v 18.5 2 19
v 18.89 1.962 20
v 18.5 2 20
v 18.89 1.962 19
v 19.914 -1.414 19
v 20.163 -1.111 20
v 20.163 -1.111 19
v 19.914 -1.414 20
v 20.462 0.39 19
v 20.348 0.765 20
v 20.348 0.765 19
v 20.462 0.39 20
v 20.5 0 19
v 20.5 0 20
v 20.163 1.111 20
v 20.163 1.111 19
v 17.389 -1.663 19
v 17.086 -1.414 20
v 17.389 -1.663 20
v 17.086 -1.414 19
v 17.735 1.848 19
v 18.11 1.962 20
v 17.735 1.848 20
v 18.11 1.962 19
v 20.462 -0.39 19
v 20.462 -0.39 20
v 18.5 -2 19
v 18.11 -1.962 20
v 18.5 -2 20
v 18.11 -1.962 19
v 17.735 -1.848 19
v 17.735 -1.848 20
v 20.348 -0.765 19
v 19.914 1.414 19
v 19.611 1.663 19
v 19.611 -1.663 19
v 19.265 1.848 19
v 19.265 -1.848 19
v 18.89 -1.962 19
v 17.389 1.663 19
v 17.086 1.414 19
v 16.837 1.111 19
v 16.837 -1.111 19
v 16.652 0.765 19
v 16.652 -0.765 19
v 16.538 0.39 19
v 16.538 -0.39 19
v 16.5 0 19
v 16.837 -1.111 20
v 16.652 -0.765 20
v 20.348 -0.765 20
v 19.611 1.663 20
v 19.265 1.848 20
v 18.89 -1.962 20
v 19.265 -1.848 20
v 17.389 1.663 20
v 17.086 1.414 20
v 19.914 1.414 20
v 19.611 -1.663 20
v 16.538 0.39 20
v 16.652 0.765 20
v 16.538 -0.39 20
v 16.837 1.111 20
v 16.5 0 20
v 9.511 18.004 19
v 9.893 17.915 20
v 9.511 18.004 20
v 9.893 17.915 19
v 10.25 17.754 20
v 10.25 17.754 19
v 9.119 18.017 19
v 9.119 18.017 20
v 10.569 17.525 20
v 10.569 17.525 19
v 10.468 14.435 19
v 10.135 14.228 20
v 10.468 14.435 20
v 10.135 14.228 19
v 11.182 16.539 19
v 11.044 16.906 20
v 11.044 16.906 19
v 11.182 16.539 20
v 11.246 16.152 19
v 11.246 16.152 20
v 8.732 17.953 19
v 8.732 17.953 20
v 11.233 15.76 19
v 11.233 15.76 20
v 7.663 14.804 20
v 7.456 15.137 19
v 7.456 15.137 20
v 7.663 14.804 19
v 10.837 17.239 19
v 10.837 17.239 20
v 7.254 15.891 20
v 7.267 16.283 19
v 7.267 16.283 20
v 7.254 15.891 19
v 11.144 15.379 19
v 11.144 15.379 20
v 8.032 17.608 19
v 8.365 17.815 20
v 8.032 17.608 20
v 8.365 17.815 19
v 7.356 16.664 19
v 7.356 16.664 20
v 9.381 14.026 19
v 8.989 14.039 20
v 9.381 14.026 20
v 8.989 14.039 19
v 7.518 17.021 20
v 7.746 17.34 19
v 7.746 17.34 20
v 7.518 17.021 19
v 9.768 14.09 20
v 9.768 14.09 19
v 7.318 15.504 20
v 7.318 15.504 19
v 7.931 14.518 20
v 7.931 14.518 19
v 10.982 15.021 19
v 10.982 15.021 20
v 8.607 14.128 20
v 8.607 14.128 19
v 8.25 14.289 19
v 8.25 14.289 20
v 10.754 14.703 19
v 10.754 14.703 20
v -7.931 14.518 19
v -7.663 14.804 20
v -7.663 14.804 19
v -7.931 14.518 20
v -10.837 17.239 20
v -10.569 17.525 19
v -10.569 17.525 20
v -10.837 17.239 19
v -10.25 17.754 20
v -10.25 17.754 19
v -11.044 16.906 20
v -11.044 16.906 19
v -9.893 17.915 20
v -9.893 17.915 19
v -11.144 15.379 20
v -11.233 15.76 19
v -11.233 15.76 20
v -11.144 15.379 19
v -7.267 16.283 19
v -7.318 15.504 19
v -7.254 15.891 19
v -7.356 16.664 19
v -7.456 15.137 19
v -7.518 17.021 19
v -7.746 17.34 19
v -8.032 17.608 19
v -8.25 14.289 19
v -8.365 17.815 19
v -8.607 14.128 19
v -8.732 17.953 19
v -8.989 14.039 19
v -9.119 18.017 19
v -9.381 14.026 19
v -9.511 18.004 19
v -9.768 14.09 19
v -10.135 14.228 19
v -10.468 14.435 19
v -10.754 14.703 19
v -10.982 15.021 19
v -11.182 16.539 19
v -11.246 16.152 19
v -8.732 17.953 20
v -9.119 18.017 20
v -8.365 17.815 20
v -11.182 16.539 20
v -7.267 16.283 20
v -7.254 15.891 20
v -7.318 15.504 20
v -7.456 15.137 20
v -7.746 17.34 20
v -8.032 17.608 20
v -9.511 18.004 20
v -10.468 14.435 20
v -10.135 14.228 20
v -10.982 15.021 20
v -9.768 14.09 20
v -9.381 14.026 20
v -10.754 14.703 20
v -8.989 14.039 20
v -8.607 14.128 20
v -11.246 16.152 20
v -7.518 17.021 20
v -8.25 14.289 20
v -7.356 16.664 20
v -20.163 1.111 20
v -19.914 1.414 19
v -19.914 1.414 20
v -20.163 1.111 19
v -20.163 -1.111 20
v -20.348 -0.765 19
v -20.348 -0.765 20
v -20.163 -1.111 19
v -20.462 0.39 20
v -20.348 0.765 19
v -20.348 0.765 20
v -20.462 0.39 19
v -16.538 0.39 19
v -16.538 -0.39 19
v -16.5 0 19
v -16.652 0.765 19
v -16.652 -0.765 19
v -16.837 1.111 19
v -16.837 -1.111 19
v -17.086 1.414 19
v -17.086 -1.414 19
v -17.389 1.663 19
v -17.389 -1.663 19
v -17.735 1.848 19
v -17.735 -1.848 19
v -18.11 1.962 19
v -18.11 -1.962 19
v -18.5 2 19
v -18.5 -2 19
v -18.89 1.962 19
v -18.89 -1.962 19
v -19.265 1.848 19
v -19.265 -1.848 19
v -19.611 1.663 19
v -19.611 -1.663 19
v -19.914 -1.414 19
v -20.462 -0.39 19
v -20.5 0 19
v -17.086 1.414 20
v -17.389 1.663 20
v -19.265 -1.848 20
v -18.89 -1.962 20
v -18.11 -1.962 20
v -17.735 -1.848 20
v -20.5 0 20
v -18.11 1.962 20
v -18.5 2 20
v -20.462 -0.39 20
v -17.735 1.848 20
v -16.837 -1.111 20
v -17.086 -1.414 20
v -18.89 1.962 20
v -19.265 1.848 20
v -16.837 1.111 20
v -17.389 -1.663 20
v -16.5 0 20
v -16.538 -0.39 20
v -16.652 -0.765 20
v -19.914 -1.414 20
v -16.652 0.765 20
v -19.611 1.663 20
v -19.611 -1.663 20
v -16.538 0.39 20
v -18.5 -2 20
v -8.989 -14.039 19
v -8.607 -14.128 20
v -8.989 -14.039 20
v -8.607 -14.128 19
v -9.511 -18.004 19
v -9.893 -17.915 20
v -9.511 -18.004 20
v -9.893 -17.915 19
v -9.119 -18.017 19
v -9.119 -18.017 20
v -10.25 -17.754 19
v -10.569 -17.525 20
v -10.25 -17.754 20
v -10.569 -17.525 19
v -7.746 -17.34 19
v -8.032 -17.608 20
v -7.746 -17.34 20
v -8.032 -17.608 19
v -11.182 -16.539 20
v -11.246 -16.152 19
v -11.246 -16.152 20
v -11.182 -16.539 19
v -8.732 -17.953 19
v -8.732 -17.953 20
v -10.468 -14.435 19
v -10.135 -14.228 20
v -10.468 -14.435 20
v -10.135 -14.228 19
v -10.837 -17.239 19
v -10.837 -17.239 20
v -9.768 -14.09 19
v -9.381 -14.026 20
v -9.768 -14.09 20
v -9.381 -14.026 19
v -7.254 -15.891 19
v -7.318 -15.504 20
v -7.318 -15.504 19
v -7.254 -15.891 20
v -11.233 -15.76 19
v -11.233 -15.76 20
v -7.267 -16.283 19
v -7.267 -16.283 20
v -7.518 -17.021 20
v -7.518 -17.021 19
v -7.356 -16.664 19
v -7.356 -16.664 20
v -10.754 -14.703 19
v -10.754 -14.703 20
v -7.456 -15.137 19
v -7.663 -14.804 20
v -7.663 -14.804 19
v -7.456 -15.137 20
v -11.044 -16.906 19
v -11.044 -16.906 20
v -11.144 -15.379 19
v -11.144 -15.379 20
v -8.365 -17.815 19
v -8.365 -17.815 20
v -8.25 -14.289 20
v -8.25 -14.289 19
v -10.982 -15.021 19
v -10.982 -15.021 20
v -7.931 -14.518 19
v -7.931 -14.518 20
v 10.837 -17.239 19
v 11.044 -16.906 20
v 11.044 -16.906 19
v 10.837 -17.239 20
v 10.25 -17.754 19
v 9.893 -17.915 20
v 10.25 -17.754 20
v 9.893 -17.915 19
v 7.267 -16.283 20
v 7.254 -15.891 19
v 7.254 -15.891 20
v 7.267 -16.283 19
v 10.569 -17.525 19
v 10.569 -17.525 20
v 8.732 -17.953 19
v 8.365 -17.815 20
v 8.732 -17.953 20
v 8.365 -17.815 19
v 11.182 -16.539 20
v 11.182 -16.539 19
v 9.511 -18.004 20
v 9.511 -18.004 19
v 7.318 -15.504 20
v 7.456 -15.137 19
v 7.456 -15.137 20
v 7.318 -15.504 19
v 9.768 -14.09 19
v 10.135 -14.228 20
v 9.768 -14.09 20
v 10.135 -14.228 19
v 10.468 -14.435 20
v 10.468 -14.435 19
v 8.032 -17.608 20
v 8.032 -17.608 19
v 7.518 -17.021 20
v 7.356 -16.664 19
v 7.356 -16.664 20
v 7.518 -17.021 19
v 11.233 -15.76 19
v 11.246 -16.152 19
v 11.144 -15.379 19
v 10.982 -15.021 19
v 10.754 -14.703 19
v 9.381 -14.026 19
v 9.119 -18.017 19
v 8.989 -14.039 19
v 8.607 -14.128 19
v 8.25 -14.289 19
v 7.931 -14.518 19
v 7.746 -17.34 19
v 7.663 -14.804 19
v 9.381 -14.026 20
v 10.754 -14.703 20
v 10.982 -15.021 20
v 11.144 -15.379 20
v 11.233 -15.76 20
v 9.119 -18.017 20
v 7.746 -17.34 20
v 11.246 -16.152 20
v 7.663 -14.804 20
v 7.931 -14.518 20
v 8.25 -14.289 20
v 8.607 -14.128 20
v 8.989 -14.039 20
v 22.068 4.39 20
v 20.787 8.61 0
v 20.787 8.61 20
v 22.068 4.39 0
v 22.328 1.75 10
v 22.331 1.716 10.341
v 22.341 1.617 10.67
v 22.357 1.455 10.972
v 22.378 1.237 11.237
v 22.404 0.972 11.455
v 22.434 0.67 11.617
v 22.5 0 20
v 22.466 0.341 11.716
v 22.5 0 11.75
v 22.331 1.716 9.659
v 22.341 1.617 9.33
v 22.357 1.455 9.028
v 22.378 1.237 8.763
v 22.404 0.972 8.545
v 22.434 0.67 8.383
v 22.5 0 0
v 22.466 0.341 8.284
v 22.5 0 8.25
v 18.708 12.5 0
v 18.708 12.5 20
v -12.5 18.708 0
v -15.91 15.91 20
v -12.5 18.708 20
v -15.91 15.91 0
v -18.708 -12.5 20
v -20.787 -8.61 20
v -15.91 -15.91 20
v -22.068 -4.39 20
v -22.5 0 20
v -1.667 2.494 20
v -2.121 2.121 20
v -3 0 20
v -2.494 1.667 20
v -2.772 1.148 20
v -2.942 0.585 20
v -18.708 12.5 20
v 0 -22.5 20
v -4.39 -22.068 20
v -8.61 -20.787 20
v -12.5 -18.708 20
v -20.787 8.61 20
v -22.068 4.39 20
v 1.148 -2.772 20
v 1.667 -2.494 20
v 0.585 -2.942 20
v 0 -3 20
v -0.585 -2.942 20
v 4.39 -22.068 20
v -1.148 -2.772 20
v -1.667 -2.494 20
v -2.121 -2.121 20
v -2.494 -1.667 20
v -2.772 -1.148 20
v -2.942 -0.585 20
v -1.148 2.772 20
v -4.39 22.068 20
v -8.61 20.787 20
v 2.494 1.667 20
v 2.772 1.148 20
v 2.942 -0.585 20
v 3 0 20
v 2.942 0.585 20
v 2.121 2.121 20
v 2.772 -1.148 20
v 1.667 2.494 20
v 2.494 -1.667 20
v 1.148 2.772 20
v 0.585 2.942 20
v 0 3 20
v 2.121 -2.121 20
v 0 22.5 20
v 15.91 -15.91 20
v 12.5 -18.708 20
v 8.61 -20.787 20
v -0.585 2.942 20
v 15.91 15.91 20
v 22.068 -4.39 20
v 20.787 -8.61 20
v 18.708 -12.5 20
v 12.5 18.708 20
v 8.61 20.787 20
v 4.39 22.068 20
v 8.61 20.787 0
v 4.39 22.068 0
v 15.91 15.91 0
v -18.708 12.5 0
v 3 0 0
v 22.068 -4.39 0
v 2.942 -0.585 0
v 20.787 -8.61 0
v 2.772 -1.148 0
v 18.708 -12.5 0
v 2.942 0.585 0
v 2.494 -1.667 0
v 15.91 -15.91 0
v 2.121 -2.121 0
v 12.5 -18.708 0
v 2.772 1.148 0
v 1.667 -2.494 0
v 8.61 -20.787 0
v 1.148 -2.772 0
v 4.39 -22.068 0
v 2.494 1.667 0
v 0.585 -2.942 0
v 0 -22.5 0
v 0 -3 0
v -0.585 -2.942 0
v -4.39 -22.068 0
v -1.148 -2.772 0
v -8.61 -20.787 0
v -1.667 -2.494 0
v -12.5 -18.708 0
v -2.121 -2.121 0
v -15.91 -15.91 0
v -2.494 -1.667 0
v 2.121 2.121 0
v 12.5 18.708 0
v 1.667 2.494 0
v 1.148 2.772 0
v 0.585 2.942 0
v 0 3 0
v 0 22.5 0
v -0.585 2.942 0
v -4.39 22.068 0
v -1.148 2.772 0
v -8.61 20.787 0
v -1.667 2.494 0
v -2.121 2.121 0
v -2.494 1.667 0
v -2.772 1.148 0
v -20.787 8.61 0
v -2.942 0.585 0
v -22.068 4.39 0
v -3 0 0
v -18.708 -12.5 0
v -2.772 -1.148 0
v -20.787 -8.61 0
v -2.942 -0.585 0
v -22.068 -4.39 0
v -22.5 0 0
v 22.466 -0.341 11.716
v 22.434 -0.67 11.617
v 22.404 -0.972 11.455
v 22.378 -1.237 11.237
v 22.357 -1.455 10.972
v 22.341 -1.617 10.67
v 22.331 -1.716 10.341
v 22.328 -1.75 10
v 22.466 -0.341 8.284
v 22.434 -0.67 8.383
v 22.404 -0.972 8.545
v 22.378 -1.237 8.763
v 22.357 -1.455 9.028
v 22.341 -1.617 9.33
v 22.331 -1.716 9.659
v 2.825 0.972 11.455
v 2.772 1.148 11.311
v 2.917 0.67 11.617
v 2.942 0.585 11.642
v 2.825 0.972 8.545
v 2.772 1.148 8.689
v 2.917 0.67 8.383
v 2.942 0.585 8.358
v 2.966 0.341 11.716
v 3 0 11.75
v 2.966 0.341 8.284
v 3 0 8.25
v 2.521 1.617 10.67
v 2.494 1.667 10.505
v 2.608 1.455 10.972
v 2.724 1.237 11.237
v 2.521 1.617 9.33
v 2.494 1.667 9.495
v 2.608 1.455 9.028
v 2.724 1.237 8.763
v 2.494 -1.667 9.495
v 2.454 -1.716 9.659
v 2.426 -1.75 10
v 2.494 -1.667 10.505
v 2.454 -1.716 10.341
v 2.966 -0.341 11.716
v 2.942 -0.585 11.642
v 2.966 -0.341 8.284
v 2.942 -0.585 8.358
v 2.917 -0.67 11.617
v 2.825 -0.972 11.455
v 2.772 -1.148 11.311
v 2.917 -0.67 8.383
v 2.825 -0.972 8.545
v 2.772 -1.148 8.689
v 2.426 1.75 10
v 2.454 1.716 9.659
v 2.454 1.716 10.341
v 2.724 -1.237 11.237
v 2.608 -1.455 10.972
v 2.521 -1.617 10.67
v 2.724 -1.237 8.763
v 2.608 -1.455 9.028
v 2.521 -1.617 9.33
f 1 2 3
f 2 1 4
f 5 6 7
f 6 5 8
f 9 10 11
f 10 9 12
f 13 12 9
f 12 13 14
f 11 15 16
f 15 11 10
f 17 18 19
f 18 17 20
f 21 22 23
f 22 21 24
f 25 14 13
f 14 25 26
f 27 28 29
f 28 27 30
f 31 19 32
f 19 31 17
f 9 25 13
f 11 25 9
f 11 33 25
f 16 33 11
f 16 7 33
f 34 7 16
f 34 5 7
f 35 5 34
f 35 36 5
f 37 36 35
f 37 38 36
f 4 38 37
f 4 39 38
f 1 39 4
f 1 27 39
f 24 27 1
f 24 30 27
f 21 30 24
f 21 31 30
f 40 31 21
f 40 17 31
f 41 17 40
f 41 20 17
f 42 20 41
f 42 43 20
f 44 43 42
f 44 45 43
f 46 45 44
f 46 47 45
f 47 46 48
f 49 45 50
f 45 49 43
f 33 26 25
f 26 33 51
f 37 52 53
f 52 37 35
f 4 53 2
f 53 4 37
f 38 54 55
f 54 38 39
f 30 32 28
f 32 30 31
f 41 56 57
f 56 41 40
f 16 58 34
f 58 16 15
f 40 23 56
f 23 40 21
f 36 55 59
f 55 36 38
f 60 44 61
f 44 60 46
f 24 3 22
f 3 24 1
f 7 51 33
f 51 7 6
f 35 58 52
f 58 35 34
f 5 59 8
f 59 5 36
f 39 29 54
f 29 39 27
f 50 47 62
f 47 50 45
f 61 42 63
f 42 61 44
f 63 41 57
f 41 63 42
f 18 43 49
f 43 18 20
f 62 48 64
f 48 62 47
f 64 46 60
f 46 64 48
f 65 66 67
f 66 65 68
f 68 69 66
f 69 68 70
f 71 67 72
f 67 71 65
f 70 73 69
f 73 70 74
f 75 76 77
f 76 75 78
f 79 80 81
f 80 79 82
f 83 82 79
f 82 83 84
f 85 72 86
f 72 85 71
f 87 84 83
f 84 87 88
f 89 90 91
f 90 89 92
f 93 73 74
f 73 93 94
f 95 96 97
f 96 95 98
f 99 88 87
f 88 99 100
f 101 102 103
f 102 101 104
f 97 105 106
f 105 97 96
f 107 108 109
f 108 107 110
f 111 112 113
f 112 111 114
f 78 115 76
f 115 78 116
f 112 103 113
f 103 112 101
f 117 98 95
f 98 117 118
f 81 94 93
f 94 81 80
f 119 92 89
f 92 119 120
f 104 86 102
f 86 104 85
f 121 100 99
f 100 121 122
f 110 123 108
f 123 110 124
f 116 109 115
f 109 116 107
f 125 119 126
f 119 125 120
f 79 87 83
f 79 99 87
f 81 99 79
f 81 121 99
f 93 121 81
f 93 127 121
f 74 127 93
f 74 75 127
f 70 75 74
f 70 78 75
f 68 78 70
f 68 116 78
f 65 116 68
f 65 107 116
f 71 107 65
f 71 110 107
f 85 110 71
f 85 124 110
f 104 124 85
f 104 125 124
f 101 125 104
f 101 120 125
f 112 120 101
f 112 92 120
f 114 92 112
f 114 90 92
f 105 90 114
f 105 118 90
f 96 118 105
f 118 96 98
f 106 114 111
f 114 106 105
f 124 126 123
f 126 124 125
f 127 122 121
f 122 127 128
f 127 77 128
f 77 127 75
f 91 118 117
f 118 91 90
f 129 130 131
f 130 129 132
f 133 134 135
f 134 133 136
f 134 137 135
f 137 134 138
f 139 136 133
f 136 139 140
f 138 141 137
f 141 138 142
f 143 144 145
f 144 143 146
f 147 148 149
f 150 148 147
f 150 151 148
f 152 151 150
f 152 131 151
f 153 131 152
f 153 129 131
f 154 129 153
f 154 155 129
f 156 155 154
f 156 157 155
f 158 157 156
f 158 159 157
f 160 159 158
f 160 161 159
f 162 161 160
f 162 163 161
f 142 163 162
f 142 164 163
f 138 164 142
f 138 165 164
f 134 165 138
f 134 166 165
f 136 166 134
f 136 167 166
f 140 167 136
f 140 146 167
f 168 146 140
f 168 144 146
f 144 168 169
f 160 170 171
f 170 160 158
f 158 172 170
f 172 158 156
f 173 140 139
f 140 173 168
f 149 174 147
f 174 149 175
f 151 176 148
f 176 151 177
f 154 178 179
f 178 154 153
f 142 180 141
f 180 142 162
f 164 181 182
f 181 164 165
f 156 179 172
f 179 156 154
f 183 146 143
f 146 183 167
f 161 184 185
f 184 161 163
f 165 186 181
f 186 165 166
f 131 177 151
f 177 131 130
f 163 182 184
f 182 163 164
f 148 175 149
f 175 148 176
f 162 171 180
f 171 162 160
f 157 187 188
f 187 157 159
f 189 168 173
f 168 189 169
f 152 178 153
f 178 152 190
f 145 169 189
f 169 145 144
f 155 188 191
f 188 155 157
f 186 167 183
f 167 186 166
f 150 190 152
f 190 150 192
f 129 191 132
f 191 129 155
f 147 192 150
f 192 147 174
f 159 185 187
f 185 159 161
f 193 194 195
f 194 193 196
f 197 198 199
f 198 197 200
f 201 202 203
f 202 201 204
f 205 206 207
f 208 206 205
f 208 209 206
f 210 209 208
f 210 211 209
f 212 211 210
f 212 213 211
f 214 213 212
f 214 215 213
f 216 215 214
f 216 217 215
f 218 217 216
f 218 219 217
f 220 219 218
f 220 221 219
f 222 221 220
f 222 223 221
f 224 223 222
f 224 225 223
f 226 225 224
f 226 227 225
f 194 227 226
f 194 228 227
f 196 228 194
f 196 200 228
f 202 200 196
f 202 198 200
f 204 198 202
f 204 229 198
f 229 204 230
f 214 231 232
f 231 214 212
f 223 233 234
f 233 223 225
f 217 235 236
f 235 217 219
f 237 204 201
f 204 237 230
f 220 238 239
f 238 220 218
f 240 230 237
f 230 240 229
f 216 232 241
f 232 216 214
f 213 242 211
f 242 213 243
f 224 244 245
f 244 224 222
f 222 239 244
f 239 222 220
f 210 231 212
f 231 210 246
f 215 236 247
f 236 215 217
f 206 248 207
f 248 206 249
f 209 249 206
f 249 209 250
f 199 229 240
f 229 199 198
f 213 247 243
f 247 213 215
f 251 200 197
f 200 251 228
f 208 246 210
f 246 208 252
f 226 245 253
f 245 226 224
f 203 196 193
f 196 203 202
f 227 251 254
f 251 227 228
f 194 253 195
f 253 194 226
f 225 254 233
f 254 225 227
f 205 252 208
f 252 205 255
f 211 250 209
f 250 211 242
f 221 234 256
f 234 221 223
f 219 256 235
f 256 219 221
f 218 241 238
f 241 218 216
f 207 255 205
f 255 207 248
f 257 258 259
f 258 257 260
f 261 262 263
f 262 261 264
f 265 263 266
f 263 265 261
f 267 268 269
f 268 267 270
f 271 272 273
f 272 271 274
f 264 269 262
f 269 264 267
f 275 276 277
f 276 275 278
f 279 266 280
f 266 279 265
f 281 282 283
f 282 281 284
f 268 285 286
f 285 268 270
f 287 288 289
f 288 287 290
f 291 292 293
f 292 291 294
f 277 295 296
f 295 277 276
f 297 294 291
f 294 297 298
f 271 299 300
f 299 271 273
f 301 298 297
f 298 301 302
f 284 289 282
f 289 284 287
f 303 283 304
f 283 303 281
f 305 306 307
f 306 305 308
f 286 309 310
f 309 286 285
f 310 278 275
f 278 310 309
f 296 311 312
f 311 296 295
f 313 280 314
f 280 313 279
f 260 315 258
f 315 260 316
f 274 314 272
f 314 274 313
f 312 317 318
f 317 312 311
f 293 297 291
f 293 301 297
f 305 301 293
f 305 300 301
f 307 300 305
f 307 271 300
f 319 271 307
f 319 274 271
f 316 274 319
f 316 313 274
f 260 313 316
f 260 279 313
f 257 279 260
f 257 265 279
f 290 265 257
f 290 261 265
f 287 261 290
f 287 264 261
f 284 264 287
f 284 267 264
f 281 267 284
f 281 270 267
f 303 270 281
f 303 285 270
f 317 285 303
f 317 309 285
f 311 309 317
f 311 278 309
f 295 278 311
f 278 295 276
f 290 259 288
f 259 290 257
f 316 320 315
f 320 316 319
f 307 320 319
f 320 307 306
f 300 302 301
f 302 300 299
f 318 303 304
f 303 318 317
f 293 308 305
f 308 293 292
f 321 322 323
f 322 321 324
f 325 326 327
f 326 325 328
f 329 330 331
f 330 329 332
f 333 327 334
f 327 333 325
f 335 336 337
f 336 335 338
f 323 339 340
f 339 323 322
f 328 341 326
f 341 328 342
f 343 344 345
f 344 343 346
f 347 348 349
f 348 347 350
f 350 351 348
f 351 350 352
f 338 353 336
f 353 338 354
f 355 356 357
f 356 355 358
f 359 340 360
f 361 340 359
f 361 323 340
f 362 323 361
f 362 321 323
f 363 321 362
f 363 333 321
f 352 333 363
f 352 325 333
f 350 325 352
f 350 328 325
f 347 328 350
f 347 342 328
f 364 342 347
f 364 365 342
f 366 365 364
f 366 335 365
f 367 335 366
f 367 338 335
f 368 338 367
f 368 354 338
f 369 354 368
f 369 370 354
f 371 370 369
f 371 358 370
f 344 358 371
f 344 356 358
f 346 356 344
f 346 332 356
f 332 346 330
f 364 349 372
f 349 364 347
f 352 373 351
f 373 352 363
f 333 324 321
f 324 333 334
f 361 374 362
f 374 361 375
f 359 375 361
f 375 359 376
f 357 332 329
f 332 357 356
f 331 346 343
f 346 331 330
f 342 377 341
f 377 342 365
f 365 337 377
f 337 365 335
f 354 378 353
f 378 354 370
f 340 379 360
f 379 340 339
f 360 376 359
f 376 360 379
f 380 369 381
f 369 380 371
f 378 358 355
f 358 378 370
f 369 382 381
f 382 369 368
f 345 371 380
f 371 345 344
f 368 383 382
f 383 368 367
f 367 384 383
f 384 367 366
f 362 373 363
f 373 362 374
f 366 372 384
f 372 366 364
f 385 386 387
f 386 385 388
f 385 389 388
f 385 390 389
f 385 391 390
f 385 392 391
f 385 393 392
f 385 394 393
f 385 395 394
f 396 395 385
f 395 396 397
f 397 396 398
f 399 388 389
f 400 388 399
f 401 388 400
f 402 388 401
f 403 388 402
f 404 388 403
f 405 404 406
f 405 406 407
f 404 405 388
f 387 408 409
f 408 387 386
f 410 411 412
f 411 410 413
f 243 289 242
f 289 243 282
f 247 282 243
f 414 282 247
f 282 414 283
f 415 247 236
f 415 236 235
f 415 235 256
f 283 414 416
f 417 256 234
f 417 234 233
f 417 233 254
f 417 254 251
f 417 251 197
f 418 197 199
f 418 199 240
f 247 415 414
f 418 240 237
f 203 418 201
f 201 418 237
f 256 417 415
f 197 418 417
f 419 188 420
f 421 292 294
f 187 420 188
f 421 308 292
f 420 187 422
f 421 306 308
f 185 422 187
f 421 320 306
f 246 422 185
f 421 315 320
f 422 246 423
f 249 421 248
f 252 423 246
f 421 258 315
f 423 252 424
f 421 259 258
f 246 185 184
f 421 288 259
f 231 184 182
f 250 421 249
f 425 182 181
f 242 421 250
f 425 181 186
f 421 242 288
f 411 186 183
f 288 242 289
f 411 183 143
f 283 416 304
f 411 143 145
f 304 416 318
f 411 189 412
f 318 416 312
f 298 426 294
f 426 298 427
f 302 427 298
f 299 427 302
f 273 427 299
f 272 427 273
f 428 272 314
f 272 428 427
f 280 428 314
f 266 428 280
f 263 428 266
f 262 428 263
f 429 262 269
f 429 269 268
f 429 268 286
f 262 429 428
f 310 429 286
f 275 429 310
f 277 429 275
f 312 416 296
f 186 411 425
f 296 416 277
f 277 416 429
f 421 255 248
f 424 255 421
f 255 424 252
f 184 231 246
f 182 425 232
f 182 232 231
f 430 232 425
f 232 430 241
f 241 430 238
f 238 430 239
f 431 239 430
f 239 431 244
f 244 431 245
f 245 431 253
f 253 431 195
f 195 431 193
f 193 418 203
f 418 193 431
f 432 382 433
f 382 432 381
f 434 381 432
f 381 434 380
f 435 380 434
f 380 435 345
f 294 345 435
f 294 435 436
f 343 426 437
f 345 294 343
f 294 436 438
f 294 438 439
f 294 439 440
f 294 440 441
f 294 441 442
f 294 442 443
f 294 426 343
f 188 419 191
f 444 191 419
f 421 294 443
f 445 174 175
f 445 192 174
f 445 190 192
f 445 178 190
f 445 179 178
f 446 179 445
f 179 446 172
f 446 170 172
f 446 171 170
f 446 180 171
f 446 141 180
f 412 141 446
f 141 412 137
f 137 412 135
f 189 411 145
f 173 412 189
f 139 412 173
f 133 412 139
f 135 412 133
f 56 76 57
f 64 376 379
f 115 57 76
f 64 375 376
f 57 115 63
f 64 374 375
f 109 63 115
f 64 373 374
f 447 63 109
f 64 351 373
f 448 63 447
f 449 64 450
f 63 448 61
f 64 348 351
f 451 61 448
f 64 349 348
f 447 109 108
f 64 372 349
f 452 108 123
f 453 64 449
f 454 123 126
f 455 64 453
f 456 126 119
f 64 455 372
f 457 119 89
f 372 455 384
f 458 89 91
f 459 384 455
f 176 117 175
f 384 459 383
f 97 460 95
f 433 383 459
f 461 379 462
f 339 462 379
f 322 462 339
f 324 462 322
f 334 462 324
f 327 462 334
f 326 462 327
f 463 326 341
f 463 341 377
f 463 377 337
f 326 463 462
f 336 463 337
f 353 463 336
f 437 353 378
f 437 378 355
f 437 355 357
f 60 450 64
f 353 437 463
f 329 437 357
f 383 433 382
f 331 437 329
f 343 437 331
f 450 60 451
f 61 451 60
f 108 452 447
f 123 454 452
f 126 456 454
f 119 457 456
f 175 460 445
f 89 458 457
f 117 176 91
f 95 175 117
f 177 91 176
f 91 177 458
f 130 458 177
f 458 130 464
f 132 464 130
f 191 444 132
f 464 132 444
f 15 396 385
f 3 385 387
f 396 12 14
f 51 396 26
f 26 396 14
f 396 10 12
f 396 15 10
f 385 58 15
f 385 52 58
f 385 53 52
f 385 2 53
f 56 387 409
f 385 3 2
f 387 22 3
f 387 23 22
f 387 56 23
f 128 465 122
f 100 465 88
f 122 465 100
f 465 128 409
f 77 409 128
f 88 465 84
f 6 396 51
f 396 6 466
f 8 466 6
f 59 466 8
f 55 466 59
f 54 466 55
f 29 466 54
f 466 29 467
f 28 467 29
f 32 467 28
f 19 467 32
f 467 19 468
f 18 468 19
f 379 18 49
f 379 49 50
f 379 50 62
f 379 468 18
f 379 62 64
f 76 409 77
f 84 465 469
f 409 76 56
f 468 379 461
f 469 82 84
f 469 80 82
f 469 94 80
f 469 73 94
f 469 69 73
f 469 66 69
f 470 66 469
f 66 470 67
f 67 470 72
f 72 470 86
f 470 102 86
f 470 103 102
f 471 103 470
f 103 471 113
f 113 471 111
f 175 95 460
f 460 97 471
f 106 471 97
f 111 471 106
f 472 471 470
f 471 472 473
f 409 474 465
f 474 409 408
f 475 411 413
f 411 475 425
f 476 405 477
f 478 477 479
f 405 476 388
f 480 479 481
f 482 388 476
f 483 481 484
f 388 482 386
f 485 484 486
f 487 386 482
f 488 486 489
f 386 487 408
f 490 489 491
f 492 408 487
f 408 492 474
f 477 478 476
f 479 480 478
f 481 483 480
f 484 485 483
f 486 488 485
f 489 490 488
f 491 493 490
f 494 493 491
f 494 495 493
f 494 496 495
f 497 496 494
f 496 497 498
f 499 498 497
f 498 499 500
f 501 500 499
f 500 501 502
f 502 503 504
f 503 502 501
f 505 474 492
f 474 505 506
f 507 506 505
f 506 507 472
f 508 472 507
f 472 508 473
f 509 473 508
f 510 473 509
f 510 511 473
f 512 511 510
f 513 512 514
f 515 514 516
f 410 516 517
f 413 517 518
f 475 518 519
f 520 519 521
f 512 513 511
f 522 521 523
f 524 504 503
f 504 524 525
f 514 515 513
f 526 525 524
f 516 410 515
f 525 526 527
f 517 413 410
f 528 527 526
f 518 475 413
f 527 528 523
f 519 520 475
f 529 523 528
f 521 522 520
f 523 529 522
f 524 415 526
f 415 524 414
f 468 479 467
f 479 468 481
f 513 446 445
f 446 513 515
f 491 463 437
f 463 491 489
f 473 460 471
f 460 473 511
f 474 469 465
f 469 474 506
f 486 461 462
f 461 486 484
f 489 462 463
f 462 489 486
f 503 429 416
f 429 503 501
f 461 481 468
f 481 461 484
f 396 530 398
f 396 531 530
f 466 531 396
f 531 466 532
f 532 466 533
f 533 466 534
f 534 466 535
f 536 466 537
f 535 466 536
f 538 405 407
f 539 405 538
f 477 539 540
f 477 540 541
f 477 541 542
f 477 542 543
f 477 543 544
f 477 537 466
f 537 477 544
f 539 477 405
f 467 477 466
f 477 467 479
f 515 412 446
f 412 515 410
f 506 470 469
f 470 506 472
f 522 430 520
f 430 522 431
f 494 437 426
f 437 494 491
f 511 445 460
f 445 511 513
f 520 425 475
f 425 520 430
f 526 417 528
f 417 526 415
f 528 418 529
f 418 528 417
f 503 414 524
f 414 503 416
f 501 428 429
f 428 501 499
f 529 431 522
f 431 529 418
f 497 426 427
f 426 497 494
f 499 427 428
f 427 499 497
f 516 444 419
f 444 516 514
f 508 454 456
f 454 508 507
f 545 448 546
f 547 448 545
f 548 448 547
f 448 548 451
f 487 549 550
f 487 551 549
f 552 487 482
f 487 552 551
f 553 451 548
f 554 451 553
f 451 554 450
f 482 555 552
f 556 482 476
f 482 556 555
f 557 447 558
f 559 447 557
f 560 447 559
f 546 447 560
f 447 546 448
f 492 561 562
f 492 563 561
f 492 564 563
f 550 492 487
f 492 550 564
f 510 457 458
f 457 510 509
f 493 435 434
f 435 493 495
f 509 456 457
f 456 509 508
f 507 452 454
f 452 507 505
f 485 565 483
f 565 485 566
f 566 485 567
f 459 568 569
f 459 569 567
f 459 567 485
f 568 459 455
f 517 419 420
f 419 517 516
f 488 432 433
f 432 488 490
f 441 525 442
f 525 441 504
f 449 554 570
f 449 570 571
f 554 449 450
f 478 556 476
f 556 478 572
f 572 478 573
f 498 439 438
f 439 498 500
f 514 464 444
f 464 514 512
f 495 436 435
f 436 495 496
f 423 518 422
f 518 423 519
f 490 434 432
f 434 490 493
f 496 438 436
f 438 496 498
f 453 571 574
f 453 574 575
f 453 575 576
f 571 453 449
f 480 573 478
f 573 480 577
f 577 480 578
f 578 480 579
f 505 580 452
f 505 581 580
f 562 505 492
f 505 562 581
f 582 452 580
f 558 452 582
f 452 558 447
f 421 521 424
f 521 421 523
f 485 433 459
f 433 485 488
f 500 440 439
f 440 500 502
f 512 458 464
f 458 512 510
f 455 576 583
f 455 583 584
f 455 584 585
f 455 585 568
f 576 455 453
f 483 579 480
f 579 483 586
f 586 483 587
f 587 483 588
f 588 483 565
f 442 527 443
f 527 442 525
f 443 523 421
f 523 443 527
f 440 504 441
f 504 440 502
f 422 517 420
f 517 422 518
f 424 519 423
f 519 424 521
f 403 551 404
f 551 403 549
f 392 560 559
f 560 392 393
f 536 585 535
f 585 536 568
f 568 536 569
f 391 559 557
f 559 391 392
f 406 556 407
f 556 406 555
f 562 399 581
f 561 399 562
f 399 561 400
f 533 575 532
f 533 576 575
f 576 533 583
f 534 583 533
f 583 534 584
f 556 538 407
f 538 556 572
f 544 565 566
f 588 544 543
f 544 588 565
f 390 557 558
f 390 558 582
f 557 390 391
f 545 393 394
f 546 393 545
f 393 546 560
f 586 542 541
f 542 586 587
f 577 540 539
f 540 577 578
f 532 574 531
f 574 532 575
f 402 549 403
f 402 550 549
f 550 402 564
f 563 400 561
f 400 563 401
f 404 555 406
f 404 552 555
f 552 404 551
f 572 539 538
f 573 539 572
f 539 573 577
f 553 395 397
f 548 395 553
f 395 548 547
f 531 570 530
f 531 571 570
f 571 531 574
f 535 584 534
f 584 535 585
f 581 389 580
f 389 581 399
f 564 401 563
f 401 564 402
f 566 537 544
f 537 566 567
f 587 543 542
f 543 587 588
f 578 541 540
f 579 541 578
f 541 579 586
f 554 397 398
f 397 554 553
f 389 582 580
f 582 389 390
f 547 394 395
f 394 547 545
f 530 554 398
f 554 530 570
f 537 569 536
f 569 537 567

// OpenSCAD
$fn = 32;

// ----------------------------------------------------------------------
// Control knob: dimpled knob
// ----------------------------------------------------------------------

// --- parameters (mm) ---
dimp_d = 4;               // finger dimple diameter
n_dimp = 6;               // number of dimples
dimp_r = 18.5;            // dimple ring radius
knob_d = 45;              // knob body diameter
knob_h = 20;              // knob body height
bore_d = 6;               // shaft bore diameter
set_d = 3.5;              // set screw bore diameter

dimp_step = 360 / n_dimp;  // dimple angular step

difference() {
  cylinder(h = knob_h, d = knob_d);
  translate([0, 0, -1]) cylinder(h = knob_h + 2, d = bore_d);
  translate([-1, 0, knob_h / 2]) rotate([0, 90, 0])
    cylinder(h = knob_d / 2 + bore_d / 2 + 2, d = set_d);  for (i = [0 : n_dimp - 1])
    rotate([0, 0, i * dimp_step])
      translate([dimp_r, 0, knob_h - 1])
        cylinder(h = 2, d = dimp_d);
}
